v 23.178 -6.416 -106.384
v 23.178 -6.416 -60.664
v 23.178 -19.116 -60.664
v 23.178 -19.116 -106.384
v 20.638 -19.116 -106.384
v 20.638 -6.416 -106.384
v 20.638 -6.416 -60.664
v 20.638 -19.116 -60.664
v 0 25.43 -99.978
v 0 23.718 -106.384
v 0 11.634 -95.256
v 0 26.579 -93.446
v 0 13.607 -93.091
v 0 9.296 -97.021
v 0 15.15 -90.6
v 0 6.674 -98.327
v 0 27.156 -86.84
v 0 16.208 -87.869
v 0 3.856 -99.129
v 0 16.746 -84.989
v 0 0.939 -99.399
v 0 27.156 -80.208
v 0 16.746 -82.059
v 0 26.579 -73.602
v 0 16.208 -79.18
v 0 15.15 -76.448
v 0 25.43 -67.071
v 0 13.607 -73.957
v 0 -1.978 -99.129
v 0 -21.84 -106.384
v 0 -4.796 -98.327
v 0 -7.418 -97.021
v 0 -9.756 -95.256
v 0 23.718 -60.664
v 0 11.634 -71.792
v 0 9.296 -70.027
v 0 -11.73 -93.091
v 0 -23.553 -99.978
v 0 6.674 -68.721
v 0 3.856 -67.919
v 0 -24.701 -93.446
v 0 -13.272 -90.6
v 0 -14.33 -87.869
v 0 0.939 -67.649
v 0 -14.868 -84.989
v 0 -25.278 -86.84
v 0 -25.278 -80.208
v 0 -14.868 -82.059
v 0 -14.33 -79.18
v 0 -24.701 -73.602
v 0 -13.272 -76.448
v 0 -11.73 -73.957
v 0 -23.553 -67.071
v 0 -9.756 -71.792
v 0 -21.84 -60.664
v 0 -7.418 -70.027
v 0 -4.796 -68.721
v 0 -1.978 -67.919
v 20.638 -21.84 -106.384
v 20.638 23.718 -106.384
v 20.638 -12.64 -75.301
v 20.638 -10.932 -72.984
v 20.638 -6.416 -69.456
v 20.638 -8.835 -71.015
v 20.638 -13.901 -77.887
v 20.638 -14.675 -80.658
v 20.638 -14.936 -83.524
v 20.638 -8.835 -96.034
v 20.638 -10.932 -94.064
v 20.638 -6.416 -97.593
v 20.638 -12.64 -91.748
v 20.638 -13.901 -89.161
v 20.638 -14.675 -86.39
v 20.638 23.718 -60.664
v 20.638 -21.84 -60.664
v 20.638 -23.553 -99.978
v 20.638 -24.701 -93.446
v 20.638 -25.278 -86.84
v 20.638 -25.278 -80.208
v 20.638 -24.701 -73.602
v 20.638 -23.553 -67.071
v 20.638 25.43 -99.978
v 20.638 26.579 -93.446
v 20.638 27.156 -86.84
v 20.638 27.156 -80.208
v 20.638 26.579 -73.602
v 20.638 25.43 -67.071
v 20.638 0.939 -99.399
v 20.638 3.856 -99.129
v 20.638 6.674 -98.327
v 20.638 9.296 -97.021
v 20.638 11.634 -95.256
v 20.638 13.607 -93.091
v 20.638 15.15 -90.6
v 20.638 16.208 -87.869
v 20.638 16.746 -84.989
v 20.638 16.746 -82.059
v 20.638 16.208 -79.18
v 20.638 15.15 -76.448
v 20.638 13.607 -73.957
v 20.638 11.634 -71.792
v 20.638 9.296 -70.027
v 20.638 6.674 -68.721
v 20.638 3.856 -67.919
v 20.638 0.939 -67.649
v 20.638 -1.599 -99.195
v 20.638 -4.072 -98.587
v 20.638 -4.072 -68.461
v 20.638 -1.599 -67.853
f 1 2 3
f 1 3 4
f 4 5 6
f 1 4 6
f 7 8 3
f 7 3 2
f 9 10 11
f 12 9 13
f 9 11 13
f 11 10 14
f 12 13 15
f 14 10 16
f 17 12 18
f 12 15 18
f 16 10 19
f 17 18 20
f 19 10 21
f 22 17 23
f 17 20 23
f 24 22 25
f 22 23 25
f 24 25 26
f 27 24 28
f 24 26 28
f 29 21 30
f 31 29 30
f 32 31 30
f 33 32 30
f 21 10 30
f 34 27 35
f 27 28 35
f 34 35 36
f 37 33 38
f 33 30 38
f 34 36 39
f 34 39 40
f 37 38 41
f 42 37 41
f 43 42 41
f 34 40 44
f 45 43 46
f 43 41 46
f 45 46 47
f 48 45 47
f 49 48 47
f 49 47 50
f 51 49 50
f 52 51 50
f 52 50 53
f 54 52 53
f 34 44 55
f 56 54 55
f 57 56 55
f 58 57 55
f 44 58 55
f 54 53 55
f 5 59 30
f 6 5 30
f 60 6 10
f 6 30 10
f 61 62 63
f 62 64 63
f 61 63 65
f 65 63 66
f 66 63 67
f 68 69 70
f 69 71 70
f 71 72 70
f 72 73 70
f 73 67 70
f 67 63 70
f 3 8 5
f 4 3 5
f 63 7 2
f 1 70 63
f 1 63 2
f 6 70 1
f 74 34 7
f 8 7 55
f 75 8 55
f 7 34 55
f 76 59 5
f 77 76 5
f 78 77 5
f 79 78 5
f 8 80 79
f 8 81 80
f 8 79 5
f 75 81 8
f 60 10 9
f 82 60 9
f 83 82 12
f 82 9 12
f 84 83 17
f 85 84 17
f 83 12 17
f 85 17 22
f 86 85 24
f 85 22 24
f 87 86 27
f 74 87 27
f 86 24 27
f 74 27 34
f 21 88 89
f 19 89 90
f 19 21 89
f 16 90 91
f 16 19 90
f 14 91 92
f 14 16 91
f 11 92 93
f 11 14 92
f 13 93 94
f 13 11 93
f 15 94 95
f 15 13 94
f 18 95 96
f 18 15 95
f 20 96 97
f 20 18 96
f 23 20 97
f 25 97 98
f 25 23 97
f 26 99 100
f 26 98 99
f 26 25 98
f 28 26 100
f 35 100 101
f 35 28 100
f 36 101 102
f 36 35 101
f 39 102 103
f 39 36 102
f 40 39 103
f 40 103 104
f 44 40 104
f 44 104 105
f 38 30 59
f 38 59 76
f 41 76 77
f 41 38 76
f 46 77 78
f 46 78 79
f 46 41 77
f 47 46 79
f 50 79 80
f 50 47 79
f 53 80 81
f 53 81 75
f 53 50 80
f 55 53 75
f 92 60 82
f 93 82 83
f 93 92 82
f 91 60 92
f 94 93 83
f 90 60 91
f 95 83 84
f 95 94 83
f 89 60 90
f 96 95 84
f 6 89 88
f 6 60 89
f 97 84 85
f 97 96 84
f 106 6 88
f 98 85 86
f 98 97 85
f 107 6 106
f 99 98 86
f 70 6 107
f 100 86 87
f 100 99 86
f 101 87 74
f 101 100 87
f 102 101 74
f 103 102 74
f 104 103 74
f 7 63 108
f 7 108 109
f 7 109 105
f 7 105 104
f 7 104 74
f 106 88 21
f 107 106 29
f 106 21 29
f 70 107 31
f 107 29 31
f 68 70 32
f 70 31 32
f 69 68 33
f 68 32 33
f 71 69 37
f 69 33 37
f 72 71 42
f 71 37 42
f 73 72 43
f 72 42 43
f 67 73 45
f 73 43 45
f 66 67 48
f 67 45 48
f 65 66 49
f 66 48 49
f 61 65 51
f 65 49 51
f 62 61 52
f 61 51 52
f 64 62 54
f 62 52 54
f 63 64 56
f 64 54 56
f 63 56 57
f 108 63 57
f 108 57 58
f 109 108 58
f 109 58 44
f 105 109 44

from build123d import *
from build123d.topology import SkipClean

# Parameters (mm, degrees)
BOSS_EXTRUDE1_DEPTH = 20.6375
CUT_EXTRUDE1_DEPTH  = 112.292933882
SKETCH3_W           = 45.72
SKETCH3_H           = 12.7
BOSS_EXTRUDE2_DEPTH = 2.54


with BuildPart() as part:
    # Sketch2 → Boss-Extrude1 (new body)
    with BuildSketch(Plane(origin=(0, 0, 0), x_dir=(0, 0, -1), z_dir=(1, 0, 0))):
        with BuildLine():
            Line((60.664128294, 0.938892053), (106.384128294, 0.938892053))
            Line((106.384128294, 0.938892053), (106.384128294, -21.840275095))
            ThreePointArc((106.384128294, -21.840275095), (83.524128294, -25.350107947), (60.664128294, -21.840275095))
            Line((60.664128294, -21.840275095), (60.664128294, 0.938892053))
        make_face()
    boss_extrude1 = extrude(amount=BOSS_EXTRUDE1_DEPTH)

    # Sketch2<5> → Cut-Extrude1 (cut, through all)
    with BuildSketch(Plane(origin=(0, 0, 0), x_dir=(0, 0, -1), z_dir=(1, 0, 0))):
        with BuildLine():
            Line((67.649128294, 0.938892053), (99.399128294, 0.938892053))
            ThreePointArc((99.399128294, 0.938892053), (83.524128294, -14.936107947), (67.649128294, 0.938892053))
        make_face()
    cut_extrude1 = extrude(amount=CUT_EXTRUDE1_DEPTH, mode=Mode.SUBTRACT)

    # Mirror4: Boss-Extrude1 across plane
    add(boss_extrude1.mirror(Plane(origin=(20.6375, 0.938892053, -60.664128294), x_dir=(0, 0, 1), z_dir=(0, 1, 0))))

    # Mirror5: Cut-Extrude1 across plane
    with SkipClean():  # the faces are left unmerged after this step: merging them gives an invalid solid
        add(cut_extrude1.mirror(Plane(origin=(20.6375, 0.938892053, -60.664128294), x_dir=(0, 0, 1), z_dir=(0, 1, 0))), mode=Mode.SUBTRACT)

    # Sketch3 → Boss-Extrude2 (add)
    with SkipClean():  # the faces are left unmerged after this step: merging them gives an invalid solid
        with BuildSketch(Plane(origin=(20.6375, 0, 0), x_dir=(0, 0, -1), z_dir=(1, 0, 0))):
            with Locations((83.524128294, -12.766104305)):
                Rectangle(SKETCH3_W, SKETCH3_H)
        extrude(amount=BOSS_EXTRUDE2_DEPTH)


solid = part.part
